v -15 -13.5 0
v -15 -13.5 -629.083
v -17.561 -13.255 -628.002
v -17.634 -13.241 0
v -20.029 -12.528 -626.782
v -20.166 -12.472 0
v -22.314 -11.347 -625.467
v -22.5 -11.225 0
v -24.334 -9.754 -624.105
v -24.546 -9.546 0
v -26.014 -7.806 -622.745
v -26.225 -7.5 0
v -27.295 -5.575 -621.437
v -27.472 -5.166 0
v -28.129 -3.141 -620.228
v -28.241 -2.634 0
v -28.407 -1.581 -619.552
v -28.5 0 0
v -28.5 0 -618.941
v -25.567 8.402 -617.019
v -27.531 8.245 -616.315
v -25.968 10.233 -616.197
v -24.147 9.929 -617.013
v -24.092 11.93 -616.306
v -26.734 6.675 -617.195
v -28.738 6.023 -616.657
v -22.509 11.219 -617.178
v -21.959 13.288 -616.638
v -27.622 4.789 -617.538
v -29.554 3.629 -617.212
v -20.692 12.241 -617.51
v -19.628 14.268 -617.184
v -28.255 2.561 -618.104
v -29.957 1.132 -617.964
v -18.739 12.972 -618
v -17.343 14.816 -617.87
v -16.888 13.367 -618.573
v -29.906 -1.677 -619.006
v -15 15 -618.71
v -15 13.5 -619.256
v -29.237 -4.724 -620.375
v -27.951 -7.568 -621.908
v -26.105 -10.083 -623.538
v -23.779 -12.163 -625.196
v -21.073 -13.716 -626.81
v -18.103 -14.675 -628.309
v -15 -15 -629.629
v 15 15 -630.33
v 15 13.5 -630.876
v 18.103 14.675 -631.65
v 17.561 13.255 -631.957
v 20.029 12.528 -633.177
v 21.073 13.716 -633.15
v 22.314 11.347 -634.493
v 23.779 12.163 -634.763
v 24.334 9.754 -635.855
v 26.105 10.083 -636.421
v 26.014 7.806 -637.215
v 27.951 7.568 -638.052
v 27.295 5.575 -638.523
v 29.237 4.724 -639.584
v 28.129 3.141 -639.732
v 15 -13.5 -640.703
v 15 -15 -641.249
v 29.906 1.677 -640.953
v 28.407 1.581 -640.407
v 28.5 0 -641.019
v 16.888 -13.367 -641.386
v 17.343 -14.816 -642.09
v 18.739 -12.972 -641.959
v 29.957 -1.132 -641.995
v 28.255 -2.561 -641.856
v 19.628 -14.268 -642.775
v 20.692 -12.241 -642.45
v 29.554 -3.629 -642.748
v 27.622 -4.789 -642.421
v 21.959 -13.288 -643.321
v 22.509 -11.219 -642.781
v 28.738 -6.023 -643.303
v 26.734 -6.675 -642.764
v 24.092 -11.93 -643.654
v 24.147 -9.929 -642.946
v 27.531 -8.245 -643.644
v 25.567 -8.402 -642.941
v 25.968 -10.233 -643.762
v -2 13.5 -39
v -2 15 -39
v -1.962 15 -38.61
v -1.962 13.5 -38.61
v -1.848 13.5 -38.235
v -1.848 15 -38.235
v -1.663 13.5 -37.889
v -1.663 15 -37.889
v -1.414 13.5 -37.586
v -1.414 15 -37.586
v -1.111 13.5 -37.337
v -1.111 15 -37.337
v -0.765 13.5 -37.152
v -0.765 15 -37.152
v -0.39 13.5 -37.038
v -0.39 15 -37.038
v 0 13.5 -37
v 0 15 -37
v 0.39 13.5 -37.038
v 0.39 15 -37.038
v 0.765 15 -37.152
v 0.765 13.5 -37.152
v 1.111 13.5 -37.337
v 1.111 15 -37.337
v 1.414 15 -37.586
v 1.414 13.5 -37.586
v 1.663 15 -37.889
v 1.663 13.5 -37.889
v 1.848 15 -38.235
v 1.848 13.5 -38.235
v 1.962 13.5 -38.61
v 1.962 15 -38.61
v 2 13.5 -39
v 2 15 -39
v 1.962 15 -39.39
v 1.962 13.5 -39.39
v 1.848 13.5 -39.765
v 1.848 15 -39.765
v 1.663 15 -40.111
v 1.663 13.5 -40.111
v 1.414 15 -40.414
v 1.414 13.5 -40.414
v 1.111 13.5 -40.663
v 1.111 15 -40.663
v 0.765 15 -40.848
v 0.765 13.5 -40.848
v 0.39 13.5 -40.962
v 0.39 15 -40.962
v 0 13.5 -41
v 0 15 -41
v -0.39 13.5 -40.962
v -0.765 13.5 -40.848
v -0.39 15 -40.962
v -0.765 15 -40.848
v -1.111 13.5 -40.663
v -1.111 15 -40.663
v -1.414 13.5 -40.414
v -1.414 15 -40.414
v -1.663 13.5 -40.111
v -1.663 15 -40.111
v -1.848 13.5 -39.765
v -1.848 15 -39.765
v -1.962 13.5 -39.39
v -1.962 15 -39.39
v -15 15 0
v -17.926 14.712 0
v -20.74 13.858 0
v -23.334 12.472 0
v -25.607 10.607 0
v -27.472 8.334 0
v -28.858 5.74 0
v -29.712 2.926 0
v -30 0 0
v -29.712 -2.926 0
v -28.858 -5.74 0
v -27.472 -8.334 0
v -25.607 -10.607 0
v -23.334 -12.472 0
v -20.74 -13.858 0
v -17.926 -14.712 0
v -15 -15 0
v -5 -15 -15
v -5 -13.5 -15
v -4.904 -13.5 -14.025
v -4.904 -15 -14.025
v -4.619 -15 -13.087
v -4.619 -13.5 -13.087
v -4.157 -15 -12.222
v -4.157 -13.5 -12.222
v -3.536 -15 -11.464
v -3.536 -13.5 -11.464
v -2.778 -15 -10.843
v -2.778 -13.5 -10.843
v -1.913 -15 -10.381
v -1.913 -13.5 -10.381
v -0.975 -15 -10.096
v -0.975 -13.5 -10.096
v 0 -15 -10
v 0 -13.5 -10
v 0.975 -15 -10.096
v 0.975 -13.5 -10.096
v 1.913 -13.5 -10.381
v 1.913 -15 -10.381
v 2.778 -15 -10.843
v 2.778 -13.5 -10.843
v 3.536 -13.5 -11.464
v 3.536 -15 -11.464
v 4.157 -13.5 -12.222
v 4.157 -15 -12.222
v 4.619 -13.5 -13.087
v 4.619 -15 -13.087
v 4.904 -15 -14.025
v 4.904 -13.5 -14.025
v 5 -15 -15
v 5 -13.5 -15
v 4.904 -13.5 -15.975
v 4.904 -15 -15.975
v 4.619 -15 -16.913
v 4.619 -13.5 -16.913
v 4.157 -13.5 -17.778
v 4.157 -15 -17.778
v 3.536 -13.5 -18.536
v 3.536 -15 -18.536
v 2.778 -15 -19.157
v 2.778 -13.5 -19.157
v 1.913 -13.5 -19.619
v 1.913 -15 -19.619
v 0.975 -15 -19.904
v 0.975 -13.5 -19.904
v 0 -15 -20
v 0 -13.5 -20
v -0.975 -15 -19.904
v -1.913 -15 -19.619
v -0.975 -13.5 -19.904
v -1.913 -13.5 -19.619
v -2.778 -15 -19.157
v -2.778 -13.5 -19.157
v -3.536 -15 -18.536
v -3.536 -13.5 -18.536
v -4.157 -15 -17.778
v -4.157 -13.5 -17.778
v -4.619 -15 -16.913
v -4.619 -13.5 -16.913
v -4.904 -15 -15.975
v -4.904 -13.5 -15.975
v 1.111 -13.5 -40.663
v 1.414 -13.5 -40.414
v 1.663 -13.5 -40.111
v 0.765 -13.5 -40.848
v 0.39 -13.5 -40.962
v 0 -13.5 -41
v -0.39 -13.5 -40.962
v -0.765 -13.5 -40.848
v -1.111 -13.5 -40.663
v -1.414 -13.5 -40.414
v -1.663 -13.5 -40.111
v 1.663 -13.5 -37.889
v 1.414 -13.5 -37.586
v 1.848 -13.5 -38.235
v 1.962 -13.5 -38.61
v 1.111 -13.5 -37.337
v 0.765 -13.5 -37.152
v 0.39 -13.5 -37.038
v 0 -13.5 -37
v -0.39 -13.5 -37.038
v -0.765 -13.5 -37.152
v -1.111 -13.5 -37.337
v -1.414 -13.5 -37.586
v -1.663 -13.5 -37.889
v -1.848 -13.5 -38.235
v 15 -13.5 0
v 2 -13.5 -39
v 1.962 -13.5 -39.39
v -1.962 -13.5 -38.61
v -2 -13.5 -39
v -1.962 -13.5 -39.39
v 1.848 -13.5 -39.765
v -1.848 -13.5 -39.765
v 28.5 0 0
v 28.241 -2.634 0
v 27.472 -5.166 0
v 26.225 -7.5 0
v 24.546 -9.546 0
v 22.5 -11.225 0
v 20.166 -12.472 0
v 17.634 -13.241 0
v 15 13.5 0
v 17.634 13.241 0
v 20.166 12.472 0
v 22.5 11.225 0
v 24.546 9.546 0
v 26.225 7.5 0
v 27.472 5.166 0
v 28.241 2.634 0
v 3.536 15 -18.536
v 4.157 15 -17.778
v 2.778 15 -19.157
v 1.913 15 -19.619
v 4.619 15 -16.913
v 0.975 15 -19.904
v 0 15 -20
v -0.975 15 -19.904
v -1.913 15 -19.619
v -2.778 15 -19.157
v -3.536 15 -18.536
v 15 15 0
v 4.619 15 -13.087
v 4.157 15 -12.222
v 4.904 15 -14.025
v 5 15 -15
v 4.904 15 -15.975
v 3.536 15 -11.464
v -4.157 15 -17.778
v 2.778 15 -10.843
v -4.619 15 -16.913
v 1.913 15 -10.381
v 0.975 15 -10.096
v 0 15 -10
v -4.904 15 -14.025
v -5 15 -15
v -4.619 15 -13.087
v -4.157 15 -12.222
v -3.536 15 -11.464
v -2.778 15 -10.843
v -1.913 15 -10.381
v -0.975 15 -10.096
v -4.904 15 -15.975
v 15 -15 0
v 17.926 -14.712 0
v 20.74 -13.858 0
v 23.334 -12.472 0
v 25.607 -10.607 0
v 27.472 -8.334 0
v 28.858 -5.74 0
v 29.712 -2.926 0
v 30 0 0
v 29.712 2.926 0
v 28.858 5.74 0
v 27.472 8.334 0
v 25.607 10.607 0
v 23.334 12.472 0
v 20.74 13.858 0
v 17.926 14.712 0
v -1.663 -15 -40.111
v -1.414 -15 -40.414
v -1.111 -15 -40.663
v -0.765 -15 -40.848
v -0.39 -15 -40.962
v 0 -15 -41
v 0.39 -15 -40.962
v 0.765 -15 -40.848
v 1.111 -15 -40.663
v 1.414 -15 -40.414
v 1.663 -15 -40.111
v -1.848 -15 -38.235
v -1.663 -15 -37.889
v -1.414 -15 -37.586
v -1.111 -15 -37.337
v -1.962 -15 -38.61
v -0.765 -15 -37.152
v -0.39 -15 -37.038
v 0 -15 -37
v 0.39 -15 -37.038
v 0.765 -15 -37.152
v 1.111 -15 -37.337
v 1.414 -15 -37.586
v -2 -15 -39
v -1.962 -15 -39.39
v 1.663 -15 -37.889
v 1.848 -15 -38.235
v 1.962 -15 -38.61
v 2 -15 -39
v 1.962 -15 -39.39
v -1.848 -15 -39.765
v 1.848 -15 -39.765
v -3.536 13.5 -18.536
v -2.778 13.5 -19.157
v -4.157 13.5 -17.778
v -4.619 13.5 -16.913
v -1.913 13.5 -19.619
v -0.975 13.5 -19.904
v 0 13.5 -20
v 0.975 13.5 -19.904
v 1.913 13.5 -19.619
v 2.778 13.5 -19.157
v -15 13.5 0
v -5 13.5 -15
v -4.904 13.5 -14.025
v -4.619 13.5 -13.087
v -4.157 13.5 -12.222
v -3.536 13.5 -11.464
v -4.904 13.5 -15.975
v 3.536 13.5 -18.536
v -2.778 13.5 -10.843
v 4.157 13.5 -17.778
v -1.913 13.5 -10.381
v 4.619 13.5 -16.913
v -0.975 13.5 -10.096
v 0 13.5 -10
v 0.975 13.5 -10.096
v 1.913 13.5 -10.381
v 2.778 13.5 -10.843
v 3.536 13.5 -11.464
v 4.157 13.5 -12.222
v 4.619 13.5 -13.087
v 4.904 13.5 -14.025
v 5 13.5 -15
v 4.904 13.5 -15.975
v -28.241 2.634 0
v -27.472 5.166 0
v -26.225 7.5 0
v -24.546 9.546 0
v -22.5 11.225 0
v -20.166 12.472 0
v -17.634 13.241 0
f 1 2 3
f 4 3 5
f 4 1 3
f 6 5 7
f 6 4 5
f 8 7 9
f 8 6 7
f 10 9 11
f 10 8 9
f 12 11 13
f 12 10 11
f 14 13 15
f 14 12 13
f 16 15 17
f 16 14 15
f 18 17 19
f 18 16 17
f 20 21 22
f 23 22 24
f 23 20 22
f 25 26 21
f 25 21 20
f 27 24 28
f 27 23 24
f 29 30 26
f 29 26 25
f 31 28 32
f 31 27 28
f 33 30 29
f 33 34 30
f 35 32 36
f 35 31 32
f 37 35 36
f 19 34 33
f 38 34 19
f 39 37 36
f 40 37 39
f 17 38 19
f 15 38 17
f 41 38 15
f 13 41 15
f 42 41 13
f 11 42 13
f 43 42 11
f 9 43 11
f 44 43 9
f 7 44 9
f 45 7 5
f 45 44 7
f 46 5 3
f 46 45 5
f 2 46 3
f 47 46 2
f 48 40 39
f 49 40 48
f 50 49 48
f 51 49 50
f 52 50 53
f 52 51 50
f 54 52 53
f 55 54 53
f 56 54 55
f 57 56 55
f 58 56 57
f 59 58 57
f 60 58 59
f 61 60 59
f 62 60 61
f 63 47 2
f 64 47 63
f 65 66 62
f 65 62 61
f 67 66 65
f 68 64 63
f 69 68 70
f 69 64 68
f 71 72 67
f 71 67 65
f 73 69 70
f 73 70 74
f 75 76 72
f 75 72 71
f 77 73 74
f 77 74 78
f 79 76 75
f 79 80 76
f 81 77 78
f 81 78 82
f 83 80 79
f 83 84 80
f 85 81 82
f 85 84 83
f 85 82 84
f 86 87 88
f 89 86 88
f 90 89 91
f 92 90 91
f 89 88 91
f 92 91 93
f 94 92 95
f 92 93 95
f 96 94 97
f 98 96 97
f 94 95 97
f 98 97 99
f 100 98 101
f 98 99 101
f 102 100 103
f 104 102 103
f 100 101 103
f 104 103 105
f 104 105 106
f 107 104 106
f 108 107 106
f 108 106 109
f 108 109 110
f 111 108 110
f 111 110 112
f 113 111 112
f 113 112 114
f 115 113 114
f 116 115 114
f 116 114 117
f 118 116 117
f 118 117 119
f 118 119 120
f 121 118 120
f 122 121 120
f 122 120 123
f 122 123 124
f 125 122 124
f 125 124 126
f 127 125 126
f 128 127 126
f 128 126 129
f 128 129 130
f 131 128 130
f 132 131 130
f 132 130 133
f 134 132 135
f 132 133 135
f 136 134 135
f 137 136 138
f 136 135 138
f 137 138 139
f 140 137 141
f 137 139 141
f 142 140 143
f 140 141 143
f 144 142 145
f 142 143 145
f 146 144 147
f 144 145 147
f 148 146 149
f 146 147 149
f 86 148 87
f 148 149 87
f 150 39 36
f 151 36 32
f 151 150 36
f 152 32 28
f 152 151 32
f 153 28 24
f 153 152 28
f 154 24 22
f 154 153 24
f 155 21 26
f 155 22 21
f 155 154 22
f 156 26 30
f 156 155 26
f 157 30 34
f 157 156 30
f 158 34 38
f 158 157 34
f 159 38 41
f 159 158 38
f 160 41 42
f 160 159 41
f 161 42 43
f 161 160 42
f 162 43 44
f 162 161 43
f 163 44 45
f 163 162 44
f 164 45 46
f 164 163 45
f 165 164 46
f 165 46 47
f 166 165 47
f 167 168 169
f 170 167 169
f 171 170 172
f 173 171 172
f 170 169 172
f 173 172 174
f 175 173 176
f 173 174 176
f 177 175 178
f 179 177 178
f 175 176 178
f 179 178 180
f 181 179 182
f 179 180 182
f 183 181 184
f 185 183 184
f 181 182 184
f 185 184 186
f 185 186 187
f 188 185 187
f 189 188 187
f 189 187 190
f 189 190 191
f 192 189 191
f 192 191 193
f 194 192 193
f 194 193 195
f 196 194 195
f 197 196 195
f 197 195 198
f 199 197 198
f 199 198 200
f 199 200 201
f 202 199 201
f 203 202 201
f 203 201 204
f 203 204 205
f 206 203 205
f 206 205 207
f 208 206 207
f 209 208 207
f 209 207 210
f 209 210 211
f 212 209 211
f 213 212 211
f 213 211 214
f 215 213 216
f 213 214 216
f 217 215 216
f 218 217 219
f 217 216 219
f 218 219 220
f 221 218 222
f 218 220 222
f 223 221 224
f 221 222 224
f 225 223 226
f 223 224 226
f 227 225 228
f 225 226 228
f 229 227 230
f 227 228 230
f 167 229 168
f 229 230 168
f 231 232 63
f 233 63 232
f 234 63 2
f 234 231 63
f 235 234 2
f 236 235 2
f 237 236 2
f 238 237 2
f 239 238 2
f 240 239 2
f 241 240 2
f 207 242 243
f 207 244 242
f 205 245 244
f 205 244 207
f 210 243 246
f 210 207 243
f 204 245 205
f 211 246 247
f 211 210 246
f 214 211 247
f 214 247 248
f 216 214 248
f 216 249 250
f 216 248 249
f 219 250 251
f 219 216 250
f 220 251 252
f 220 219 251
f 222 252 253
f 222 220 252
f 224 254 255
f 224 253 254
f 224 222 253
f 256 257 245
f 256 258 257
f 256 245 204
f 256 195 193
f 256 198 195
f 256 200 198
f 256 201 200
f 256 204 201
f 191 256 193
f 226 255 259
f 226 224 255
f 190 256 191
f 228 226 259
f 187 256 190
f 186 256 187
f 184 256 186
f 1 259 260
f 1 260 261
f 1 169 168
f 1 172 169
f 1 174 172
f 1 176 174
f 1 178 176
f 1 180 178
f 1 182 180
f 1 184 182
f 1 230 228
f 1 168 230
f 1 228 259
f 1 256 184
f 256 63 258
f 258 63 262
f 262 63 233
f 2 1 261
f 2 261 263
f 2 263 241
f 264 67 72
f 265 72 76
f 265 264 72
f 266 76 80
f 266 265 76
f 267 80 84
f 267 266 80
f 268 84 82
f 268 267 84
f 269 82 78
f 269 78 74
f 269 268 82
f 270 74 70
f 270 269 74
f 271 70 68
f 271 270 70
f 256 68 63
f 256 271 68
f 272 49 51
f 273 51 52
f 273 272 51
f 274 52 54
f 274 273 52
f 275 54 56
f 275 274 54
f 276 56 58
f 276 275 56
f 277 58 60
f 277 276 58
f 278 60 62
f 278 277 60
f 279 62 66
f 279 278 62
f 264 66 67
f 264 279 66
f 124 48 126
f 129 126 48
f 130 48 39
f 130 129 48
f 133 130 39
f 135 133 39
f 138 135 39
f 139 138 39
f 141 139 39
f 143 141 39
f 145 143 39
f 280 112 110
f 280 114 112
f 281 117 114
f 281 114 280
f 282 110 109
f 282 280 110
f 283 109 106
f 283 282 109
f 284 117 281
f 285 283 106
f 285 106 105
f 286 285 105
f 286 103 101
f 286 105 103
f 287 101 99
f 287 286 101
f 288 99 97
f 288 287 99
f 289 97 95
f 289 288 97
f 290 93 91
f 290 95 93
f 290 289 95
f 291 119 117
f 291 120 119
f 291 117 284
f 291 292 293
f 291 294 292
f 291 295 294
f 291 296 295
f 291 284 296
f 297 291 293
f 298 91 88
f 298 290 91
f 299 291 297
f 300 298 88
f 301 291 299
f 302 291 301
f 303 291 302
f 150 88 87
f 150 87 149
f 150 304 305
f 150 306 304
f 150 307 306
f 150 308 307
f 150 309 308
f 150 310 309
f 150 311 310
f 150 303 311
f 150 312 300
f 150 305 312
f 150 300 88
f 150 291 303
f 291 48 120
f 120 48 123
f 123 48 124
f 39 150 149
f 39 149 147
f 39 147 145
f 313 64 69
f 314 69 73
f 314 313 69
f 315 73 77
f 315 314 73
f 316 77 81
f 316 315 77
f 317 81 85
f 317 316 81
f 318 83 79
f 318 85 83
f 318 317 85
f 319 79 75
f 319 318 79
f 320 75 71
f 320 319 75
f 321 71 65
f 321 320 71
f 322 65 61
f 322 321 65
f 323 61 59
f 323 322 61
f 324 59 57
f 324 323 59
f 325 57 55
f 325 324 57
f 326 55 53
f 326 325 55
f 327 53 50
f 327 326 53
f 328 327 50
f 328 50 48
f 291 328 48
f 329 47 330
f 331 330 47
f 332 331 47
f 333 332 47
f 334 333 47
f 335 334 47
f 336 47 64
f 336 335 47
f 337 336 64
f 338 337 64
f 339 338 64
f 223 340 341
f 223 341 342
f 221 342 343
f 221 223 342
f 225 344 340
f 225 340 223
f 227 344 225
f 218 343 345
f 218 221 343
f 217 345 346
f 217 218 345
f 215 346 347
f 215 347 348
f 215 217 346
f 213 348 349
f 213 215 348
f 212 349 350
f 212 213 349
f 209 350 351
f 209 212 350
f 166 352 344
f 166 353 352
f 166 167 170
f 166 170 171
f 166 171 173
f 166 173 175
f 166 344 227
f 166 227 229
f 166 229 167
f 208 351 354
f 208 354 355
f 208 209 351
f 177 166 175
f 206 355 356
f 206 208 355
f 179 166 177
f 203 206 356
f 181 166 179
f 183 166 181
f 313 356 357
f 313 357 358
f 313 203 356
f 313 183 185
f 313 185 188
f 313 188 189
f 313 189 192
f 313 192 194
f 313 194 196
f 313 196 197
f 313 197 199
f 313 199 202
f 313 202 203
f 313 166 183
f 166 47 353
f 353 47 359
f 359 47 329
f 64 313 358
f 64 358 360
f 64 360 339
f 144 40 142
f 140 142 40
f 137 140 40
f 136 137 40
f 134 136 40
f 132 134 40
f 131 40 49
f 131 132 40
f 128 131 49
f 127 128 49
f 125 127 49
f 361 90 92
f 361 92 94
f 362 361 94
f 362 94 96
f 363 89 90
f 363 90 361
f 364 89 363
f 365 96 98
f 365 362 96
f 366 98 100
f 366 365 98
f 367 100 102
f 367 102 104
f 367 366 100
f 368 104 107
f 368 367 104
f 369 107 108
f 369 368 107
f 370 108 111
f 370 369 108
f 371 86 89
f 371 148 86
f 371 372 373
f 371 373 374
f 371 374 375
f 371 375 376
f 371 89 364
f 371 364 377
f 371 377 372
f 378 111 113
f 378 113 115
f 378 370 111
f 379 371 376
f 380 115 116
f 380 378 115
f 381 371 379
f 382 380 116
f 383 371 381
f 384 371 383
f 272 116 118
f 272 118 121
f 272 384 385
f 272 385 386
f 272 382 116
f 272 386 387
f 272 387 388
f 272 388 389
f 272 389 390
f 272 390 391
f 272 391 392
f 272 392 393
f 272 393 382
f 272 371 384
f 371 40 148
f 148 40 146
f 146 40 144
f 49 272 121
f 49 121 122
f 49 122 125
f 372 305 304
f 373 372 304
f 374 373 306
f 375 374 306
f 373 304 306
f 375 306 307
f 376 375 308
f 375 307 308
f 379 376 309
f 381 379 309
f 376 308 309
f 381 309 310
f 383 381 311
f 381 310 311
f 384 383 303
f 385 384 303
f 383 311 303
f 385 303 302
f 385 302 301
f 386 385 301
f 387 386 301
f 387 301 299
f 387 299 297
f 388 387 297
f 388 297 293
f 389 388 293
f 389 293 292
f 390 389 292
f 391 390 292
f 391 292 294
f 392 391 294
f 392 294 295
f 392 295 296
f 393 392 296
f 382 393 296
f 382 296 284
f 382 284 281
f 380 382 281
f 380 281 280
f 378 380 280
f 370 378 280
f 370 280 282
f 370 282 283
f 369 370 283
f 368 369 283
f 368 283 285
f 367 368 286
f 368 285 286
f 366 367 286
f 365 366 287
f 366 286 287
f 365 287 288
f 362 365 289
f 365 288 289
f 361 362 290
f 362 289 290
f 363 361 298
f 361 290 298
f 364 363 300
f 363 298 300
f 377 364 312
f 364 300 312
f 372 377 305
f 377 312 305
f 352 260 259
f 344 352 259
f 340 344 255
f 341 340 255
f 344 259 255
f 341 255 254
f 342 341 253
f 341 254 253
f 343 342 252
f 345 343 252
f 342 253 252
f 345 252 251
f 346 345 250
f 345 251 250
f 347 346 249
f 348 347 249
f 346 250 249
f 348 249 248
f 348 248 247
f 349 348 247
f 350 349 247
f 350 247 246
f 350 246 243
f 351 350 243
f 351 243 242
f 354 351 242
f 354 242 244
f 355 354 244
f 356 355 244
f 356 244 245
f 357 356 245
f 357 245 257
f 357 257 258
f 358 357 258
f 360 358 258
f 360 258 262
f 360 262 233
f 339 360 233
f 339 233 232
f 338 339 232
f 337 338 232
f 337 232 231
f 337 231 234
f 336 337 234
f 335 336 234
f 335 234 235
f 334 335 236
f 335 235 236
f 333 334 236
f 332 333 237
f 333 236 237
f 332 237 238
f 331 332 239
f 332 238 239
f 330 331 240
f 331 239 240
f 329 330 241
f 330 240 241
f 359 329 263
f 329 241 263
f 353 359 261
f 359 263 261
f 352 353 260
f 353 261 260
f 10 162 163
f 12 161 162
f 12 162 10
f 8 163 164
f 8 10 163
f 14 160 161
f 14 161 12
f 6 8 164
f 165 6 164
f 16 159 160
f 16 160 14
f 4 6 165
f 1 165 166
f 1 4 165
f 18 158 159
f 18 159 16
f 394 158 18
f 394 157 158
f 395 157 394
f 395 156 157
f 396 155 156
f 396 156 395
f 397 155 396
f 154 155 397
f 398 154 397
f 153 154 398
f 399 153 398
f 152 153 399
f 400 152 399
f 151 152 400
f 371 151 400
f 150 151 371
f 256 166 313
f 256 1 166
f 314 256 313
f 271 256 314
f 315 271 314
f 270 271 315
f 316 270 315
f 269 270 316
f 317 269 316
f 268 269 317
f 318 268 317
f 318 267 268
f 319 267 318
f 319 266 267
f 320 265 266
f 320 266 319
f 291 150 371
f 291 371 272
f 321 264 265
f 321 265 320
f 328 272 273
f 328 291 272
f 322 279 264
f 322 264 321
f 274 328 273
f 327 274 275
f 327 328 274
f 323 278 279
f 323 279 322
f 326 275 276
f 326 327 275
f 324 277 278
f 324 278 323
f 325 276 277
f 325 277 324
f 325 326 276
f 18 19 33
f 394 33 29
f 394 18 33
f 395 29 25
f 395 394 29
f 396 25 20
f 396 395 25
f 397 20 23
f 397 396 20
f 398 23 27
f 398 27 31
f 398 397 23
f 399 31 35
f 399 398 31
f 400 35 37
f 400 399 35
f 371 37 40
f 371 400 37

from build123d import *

# Parameters (mm, degrees)
F1_DEPTH      = 644
F2_R          = 5
F2_R_2        = 2
F3_DEPTH      = 40
F8_W          = 94.9183702469
F8_H          = 83.3485722542
F9_DEPTH      = 11
F9_DEPTH_BACK = 25


with BuildPart() as f1:
    # F0 (on Top) → F1 (new body)
    with BuildSketch(Plane.XY):
        with BuildLine():
            Line((15, 15), (-15, 15))
            ThreePointArc((-15, 15), (-25.6066017178, 10.6066017178), (-30, 0))
            ThreePointArc((-30, 0), (-25.6066017178, -10.6066017178), (-15, -15))
            Line((-15, -15), (15, -15))
            ThreePointArc((15, -15), (25.6066017178, -10.6066017178), (30, 0))
            ThreePointArc((30, 0), (25.6066017178, 10.6066017178), (15, 15))
        make_face()
        with BuildLine():
            ThreePointArc((-28.5, 0), (-24.545941546, 9.545941546), (-15, 13.5))
            Line((-15, 13.5), (15, 13.5))
            ThreePointArc((15, 13.5), (24.545941546, 9.545941546), (28.5, 0))
            ThreePointArc((28.5, 0), (24.545941546, -9.545941546), (15, -13.5))
            Line((15, -13.5), (-15, -13.5))
            ThreePointArc((-15, -13.5), (-24.545941546, -9.545941546), (-28.5, 0))
        make_face(mode=Mode.SUBTRACT)
    extrude(amount=-F1_DEPTH)

    # F2 (on face) → F3 (cut)
    with BuildSketch(Plane(origin=(0, 15, 0), x_dir=(-1, 0, 0), z_dir=(0, 1, 0))):
        with Locations((0, -15)):
            Circle(F2_R)
        with Locations((0, -39)):
            Circle(F2_R_2)
    extrude(amount=-F3_DEPTH, mode=Mode.SUBTRACT)

    # F8 (on face) → F9 (cut, two sides)
    with BuildSketch(Plane(origin=(-194.0232580496, 182.3222238501, -500.9261930928), x_dir=(0.9396926208, 0.1169777784, -0.3213938048), z_dir=(-0.3420201433, 0.3213938048, -0.8830222216))) as f9_sk:
        with Locations((206.5364569426, 219.5619344711)):
            Rectangle(F8_W, F8_H)
    extrude(amount=-F9_DEPTH, mode=Mode.SUBTRACT)
    extrude(f9_sk.sketch, amount=F9_DEPTH_BACK, mode=Mode.SUBTRACT)


solid = f1.part
